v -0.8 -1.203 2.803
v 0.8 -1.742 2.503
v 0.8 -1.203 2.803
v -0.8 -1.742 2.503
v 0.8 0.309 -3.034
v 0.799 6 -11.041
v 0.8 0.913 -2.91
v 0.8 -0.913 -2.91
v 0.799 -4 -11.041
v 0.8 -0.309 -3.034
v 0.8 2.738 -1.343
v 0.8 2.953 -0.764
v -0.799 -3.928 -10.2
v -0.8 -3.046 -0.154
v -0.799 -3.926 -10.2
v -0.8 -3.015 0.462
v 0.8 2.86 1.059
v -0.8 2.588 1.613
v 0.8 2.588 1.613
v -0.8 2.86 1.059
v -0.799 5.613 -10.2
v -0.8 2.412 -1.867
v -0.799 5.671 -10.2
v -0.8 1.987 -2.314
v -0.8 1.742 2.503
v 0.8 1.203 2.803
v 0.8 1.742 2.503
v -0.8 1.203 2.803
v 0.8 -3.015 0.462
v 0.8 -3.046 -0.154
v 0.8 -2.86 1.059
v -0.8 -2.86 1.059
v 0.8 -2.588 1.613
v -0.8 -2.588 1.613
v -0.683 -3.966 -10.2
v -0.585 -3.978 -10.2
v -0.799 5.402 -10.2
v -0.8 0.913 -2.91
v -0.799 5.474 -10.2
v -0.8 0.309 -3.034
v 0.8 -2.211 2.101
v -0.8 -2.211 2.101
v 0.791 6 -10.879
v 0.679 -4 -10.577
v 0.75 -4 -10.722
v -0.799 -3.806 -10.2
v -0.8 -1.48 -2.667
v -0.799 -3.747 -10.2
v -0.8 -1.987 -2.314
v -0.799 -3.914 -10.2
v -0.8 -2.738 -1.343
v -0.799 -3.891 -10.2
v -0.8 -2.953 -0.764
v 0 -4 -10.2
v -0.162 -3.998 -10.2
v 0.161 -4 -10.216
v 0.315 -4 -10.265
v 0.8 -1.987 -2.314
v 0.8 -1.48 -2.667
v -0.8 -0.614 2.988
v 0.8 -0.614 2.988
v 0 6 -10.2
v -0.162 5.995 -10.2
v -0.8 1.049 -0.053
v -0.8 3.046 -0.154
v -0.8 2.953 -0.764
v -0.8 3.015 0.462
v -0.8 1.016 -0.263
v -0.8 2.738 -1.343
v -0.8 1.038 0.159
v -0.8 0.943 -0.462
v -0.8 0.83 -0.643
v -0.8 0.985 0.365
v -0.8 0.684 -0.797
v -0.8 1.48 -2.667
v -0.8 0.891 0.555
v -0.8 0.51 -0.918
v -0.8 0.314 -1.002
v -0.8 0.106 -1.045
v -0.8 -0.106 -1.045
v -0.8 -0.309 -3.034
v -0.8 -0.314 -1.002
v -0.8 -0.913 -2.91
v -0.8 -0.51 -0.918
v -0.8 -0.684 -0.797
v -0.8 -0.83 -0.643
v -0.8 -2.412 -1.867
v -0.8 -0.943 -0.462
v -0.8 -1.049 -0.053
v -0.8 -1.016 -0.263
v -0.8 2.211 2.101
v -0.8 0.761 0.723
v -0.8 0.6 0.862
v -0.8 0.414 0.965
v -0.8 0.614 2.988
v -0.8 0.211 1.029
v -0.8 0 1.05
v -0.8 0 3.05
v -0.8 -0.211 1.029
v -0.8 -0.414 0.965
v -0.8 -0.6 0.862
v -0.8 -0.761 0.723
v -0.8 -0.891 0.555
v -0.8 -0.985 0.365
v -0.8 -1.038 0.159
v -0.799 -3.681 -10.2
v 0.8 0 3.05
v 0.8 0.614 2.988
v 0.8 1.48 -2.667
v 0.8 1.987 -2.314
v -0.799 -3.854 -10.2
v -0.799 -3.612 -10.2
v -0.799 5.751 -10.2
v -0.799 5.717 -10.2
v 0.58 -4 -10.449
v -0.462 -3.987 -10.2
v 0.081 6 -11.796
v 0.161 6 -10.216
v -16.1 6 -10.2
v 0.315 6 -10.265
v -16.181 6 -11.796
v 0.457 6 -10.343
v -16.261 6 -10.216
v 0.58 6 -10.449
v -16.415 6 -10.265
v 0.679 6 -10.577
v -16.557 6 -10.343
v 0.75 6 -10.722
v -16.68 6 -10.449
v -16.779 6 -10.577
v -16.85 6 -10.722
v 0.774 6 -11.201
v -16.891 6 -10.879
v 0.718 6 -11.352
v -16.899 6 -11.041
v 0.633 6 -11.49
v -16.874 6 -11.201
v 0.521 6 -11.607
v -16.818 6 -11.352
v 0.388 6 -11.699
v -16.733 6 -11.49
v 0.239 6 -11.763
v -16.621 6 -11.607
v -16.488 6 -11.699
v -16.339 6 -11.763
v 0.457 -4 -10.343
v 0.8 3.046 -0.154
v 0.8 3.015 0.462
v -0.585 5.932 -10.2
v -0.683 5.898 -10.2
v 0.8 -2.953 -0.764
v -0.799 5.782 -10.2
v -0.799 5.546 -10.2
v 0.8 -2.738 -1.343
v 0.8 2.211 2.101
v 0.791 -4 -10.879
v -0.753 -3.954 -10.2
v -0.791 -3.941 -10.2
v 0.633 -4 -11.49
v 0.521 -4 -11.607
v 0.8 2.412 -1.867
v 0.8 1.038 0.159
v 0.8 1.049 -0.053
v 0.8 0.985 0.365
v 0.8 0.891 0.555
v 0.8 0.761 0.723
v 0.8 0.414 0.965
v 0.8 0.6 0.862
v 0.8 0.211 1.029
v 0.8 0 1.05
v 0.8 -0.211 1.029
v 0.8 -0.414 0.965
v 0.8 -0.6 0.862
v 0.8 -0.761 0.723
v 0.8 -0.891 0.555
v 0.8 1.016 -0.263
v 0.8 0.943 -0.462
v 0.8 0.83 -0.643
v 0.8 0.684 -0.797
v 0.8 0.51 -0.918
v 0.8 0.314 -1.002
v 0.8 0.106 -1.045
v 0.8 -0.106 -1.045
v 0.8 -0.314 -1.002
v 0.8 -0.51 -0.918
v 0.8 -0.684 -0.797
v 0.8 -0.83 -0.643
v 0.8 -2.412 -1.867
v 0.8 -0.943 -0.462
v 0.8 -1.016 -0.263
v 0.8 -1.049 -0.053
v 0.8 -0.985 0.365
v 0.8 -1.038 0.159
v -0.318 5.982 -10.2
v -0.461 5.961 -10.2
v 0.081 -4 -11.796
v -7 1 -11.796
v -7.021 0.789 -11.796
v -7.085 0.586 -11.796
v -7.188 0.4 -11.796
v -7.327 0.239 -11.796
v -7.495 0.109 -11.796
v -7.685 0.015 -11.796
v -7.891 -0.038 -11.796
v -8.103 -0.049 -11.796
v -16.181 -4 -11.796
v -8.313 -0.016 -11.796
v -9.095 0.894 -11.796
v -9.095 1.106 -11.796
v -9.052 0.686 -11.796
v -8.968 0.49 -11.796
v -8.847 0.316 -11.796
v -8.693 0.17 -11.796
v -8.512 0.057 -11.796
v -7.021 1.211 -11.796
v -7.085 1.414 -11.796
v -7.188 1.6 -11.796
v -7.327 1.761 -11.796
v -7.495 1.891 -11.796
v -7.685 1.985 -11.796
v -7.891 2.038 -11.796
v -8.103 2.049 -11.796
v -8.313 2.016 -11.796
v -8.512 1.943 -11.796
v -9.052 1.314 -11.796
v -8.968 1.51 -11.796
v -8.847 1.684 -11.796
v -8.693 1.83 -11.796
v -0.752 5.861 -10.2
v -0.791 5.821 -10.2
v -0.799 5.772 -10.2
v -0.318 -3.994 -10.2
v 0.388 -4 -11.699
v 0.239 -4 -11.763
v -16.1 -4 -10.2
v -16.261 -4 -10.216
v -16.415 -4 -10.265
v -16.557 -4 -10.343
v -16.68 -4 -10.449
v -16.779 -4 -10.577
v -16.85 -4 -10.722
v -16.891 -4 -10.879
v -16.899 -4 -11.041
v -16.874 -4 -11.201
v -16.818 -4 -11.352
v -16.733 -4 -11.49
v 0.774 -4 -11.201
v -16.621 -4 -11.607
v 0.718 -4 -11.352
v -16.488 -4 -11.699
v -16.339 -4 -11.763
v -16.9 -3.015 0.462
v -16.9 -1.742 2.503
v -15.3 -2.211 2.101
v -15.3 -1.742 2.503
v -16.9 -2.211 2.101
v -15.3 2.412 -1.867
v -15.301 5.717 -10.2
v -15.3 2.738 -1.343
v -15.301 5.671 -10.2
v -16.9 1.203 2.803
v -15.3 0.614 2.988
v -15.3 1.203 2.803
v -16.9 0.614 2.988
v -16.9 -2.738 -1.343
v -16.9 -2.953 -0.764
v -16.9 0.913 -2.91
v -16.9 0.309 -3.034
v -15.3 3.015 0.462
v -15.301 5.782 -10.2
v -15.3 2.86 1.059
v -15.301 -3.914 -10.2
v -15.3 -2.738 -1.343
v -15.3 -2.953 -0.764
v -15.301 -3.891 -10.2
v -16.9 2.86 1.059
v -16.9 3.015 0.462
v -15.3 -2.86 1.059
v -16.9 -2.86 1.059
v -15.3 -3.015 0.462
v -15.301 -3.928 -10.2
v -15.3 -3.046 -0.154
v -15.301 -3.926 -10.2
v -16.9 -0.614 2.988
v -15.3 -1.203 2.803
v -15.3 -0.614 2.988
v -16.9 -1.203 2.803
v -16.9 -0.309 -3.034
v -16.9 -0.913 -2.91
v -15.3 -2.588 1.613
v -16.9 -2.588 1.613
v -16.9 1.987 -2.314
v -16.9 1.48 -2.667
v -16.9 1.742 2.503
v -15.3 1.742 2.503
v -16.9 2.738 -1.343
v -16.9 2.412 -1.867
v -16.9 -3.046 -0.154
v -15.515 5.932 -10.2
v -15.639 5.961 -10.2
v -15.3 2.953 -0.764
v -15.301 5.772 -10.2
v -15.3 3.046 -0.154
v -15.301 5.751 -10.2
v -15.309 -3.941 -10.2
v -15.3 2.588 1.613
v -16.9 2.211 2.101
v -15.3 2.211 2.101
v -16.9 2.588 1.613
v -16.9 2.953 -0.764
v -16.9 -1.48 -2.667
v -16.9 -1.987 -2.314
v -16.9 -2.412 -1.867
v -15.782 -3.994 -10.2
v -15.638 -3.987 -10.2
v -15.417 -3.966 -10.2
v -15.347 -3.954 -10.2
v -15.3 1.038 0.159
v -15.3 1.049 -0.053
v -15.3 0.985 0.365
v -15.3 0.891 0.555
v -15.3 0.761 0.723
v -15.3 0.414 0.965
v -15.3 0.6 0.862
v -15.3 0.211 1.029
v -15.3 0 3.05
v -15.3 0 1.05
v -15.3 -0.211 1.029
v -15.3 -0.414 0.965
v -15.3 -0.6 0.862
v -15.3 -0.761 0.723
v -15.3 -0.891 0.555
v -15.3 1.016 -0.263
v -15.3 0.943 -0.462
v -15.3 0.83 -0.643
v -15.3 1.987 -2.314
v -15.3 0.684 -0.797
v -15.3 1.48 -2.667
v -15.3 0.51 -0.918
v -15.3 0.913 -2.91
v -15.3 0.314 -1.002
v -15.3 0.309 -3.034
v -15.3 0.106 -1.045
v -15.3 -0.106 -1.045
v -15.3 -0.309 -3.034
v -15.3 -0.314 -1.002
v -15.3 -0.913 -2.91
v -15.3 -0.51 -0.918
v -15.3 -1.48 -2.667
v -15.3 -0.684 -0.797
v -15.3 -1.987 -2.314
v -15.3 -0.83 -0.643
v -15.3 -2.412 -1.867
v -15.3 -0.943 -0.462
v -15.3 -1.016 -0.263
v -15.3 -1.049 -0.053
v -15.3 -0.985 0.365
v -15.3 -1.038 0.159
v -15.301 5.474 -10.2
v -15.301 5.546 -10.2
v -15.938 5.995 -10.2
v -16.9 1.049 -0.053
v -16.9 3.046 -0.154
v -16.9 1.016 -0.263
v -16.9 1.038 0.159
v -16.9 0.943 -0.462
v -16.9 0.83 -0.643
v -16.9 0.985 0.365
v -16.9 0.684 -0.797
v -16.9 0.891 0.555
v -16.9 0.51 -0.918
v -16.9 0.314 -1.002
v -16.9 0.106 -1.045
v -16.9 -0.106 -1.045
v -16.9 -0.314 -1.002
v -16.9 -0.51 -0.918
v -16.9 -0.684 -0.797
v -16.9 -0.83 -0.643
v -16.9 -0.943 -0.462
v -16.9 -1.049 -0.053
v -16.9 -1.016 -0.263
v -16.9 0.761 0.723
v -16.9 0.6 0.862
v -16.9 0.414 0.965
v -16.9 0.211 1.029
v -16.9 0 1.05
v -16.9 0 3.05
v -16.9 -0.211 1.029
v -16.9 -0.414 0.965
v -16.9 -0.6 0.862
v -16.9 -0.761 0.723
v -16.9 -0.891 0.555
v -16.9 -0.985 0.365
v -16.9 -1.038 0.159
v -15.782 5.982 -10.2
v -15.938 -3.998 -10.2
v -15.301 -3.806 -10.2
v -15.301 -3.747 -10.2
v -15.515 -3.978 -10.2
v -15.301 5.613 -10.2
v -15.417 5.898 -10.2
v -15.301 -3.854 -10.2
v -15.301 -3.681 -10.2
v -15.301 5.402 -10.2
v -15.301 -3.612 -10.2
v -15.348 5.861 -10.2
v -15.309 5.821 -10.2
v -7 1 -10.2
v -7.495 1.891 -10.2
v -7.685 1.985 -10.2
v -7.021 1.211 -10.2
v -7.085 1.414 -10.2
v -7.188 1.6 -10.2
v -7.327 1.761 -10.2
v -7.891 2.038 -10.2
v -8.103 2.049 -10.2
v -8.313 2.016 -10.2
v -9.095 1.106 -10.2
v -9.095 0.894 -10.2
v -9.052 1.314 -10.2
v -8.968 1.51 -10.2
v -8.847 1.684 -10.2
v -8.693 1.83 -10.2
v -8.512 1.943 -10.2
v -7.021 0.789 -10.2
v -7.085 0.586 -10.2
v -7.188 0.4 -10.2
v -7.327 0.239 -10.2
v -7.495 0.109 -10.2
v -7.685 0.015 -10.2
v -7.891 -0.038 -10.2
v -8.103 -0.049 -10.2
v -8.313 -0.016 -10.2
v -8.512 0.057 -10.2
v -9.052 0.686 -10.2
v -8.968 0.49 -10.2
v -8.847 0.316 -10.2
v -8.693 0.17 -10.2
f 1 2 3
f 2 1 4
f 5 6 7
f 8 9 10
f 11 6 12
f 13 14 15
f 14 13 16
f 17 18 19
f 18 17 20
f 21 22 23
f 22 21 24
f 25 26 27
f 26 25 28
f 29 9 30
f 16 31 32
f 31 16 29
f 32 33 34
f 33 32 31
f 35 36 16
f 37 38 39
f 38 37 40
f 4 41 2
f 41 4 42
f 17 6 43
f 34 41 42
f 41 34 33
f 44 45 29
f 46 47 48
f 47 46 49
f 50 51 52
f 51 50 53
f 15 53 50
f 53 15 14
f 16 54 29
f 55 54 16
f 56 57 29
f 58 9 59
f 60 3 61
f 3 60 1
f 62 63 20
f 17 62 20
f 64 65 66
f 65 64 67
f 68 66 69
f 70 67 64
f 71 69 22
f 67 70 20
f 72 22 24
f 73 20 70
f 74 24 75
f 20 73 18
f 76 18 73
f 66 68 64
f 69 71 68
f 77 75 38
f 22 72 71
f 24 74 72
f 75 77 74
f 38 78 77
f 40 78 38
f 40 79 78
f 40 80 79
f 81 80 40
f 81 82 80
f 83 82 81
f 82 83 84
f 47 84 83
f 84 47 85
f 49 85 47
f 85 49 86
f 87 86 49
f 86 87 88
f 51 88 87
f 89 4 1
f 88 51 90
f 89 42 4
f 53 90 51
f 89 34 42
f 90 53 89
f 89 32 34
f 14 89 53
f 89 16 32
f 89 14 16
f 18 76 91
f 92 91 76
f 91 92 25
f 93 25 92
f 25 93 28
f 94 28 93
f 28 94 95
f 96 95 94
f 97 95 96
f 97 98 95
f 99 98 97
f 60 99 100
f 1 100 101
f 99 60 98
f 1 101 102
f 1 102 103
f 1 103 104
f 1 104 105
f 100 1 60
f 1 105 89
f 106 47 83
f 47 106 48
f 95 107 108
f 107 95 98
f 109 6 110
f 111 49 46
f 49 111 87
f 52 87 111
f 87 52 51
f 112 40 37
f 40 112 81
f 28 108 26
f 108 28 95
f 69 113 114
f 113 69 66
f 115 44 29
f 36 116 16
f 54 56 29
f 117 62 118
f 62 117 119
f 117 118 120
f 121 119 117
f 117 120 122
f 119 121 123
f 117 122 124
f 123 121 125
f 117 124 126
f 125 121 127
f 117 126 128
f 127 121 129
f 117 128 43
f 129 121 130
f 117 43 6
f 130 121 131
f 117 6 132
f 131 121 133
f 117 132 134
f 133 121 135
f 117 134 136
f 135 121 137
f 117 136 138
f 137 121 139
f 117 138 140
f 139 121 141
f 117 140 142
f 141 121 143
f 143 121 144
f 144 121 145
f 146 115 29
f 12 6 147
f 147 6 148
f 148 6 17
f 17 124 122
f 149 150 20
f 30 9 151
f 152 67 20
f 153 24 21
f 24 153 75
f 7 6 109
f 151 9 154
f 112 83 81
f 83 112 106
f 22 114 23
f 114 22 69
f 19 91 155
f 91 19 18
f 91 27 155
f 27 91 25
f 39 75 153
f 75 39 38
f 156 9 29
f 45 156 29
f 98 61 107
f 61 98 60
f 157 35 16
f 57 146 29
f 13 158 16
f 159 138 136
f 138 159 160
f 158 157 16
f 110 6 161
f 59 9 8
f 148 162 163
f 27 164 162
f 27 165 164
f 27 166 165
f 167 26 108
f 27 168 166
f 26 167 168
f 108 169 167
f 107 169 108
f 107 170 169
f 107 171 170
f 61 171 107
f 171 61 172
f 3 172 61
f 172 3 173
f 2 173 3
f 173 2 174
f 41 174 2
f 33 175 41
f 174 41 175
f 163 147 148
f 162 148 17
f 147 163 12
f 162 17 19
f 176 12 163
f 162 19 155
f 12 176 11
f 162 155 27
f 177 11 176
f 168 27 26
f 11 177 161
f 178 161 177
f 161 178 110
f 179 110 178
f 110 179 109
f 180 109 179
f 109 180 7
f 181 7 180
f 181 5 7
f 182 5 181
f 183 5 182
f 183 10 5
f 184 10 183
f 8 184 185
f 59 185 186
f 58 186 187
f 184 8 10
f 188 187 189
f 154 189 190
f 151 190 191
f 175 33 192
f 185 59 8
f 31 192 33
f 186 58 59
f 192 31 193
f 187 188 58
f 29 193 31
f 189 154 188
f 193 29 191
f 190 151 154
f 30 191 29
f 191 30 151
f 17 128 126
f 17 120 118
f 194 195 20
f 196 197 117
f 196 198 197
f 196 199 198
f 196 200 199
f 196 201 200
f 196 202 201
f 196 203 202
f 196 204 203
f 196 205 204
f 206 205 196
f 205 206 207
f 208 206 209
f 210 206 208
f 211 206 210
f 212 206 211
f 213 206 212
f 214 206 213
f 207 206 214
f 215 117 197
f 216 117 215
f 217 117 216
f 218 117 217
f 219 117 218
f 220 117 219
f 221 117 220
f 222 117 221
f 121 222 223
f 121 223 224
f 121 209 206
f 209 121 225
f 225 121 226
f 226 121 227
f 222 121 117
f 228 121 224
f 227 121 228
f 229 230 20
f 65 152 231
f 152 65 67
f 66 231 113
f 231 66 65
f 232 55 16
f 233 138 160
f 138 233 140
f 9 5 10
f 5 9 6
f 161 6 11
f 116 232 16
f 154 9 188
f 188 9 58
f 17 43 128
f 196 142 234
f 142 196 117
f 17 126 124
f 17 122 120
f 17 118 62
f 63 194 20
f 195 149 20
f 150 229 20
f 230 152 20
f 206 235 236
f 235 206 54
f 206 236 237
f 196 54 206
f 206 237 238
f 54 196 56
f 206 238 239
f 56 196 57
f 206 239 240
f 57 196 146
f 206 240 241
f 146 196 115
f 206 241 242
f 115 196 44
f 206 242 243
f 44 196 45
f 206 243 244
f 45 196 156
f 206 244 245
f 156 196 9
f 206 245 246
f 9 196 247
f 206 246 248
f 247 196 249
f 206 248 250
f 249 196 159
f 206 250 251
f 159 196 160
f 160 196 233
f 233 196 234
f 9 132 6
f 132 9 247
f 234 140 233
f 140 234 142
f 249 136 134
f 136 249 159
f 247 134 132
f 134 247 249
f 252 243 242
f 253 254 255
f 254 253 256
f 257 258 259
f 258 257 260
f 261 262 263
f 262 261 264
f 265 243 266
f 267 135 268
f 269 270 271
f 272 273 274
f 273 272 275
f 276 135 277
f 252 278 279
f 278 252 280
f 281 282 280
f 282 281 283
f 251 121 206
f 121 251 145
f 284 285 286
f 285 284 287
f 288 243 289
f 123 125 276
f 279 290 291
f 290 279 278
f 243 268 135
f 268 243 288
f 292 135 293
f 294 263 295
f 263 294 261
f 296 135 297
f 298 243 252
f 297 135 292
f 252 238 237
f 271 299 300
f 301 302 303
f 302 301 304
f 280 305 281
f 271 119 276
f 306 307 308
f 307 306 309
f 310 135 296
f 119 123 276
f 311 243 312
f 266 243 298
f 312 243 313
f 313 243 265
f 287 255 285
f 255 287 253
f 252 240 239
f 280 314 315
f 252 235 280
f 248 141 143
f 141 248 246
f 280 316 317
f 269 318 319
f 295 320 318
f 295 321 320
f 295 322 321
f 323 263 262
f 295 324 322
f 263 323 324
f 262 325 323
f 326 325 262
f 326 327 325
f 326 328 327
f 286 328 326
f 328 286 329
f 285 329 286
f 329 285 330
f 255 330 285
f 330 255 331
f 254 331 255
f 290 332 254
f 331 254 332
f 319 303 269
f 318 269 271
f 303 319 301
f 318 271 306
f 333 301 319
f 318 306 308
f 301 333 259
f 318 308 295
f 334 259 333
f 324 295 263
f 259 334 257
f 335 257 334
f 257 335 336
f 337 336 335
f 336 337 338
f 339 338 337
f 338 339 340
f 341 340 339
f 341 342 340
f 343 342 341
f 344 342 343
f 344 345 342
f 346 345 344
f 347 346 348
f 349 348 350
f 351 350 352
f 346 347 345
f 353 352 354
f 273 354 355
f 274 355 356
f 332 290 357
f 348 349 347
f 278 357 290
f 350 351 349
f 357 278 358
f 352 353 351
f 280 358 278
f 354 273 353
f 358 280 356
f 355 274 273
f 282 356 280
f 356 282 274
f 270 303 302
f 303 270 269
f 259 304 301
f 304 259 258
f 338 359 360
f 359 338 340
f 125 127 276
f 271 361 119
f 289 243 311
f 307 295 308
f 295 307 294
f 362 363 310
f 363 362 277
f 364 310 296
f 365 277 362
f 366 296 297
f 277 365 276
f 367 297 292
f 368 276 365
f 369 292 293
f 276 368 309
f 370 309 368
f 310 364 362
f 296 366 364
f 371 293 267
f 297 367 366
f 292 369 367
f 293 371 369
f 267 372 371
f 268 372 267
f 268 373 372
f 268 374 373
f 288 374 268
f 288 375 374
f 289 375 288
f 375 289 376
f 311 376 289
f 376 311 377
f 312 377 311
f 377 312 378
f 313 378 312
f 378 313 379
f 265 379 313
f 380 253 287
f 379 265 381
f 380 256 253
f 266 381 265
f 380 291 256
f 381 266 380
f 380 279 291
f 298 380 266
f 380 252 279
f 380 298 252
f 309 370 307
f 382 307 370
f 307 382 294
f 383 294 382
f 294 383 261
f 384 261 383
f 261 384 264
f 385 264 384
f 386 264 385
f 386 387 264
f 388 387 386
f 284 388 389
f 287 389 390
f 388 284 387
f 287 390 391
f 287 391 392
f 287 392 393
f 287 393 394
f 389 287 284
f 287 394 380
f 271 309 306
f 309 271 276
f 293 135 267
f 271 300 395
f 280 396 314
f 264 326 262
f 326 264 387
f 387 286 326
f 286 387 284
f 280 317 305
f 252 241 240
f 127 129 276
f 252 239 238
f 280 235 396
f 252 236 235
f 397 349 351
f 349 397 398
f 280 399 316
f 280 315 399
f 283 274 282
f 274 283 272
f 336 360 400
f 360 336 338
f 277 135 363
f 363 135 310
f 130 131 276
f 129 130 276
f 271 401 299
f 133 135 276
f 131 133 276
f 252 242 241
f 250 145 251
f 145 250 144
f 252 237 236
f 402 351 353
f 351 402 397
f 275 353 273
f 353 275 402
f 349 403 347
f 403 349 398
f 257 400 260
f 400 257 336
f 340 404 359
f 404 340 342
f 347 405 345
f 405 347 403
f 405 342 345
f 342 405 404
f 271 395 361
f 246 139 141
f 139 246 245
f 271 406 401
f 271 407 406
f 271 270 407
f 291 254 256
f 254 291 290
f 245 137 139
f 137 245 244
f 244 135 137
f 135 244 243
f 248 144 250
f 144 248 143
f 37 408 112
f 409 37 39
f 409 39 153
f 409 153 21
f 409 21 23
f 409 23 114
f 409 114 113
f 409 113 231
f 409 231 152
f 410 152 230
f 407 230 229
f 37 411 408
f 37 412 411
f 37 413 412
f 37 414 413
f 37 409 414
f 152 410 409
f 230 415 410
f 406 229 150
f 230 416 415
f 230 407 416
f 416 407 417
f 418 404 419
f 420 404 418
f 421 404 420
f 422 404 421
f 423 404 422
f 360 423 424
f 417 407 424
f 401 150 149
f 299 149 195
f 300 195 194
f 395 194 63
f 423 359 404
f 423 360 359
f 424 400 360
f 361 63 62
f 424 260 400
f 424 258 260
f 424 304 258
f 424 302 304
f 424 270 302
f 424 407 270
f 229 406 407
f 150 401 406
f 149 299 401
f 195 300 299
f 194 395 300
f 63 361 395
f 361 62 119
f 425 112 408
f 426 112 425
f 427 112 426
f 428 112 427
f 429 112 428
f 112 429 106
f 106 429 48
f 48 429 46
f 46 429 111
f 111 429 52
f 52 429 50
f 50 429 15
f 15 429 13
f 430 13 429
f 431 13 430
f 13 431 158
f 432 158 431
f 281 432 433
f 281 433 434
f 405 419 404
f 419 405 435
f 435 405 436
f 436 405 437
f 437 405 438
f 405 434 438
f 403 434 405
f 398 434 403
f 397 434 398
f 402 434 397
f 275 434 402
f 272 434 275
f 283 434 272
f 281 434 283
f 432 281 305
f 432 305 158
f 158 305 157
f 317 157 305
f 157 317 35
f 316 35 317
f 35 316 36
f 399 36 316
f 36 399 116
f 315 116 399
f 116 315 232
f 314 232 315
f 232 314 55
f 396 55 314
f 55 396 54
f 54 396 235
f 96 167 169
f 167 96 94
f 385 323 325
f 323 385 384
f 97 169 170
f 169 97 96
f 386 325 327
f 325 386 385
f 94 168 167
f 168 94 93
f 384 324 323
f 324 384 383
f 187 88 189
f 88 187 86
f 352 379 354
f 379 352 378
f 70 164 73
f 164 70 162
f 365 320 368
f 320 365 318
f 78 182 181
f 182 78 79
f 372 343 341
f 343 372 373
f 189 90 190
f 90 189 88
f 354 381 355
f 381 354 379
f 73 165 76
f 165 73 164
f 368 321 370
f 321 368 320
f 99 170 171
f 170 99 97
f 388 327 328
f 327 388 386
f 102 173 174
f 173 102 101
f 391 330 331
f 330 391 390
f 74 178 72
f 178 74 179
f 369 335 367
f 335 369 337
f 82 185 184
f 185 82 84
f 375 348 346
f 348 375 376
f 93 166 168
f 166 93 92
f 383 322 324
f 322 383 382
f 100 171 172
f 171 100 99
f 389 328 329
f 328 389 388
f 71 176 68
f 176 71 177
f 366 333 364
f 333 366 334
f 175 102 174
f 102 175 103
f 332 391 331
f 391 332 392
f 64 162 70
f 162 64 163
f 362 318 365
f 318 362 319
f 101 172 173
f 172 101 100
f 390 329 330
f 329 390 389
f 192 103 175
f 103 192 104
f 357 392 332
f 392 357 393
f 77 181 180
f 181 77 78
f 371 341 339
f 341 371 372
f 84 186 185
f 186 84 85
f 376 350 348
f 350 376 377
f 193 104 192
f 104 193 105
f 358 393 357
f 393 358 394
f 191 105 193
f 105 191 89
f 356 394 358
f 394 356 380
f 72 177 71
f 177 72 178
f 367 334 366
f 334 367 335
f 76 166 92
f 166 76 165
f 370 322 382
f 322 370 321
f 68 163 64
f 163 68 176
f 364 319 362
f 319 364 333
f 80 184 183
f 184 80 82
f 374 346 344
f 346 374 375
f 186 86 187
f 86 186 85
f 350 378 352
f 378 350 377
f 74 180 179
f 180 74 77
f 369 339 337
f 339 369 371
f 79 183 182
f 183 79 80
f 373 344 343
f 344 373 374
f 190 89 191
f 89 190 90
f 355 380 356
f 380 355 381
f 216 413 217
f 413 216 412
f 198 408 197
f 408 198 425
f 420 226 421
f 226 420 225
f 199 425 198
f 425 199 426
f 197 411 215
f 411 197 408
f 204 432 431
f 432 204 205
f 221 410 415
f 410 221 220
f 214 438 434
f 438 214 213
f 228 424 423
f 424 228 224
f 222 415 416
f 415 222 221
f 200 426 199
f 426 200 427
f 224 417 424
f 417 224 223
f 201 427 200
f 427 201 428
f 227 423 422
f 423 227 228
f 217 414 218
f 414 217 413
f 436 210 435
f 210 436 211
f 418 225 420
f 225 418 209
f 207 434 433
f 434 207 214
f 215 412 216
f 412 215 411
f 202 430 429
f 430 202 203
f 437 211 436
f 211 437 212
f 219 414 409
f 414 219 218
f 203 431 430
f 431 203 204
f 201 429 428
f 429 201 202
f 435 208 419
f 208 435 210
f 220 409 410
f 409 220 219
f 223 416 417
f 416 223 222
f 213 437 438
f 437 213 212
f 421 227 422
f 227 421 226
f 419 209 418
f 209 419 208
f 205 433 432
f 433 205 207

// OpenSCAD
screw_hole = 2.1;
w = 14.5;
h = 11;
t = 1.6;

$fn=31;

module rod(){
    translate([-h, 1, 0])rotate(90, [1, 0, 0])cylinder(d=t, h=10, center=true);
    }

module side(){
    hull(){
        cylinder(d=screw_hole + 4, h=t, center=true);
        rod();
    }
}

rotate(-90, [0, 1, 0])
difference(){
union(){
    side();
    translate([0, 0, w + t])side();
    hull(){
        rod();
        translate([0, 0, w + t])rod();
        }
    }
cylinder(h=100, d=screw_hole, center=true);    
translate([0, 1, w/2 + t/2])rotate(90, [0, 1, 0])cylinder(h=100, d=screw_hole, center=true);
}
